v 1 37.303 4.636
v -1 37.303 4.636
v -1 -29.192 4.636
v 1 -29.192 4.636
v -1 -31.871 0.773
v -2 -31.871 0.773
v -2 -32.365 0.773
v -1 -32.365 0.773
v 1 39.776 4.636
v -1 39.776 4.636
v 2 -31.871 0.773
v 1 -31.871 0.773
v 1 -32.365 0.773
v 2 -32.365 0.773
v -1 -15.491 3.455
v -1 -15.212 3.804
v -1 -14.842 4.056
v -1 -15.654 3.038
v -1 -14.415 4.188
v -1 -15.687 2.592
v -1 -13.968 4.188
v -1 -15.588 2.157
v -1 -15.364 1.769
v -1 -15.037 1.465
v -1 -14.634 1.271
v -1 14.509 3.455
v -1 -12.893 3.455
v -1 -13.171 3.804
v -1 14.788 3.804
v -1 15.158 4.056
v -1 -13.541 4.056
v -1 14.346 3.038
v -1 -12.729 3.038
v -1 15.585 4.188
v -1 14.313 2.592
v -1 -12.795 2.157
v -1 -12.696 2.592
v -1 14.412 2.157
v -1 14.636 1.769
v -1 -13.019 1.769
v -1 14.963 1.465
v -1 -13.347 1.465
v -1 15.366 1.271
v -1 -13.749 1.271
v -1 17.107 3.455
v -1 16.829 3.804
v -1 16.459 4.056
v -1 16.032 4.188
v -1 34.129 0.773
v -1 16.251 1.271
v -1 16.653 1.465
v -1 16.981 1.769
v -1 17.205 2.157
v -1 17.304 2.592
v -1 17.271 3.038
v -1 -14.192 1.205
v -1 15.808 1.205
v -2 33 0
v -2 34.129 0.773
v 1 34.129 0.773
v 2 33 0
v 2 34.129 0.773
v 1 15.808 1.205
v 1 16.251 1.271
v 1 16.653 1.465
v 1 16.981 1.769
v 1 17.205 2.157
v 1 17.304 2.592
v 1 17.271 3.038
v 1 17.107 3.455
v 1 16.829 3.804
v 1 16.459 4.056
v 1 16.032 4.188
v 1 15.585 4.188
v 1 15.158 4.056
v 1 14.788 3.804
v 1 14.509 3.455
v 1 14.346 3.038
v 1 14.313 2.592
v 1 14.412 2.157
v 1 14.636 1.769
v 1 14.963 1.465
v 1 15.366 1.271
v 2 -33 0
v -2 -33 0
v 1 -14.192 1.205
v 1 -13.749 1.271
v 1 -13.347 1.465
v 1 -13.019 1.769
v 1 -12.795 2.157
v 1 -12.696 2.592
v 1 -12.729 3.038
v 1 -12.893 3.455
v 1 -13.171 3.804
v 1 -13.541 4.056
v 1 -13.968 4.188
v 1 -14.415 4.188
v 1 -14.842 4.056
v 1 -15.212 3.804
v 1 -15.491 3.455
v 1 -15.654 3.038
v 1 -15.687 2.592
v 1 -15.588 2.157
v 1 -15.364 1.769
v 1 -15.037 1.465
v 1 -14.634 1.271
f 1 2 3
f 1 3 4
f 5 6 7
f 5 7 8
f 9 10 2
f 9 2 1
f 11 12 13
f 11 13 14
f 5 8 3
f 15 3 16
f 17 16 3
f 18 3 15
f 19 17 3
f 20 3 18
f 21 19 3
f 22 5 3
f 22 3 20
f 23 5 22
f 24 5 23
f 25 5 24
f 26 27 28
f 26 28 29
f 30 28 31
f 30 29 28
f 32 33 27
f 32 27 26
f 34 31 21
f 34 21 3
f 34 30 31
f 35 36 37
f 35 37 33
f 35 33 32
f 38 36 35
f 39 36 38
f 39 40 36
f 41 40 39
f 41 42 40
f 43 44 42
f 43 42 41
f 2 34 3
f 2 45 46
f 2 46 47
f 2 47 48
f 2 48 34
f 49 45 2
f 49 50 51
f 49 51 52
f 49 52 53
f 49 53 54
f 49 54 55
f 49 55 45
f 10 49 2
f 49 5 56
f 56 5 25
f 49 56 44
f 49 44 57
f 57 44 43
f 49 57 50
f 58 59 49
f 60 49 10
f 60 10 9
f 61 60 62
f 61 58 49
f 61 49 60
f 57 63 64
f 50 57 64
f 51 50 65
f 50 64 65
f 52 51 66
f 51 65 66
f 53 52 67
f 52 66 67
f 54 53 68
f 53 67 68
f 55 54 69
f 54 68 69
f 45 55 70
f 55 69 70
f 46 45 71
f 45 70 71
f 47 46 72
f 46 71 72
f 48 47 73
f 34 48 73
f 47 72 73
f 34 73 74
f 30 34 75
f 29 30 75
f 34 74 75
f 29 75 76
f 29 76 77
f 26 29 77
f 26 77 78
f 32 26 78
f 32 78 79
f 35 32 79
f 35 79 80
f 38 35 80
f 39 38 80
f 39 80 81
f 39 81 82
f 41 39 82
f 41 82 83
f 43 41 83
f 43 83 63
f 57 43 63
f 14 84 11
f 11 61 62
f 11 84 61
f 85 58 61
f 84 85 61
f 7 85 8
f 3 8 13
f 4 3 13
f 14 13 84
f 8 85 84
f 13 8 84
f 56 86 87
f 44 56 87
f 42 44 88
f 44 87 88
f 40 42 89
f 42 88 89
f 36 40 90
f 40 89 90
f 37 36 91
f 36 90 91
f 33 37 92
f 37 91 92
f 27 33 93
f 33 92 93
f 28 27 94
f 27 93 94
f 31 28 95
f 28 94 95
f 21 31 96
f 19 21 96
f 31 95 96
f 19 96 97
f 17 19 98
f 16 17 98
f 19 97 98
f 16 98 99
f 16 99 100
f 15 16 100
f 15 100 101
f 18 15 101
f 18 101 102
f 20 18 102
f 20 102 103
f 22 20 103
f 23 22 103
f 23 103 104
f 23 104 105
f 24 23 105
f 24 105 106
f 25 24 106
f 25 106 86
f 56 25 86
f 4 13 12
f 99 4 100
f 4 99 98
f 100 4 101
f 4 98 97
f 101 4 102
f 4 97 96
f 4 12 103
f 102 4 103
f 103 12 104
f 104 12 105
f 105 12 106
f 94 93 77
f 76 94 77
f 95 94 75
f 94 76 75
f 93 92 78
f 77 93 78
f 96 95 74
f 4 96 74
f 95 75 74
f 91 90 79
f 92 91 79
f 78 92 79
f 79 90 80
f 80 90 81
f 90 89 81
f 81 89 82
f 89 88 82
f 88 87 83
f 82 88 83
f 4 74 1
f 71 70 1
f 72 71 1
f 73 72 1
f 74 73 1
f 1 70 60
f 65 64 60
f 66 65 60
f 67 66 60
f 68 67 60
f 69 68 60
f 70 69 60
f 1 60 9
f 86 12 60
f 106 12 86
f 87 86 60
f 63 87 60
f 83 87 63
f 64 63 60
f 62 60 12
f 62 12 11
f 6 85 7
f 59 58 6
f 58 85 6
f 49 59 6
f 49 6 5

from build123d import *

# Parameters (mm, degrees)
SKETCH1_W             = 4
SKETCH1_H             = 66
BOSS_EXTRUDE1_DEPTH   = 1
SKETCH1_2_W           = 4
SKETCH1_2_H           = 66
BOSS_EXTRUDE2_DEPTH   = 1.36844839
SKETCH4_W             = 2
SKETCH4_H             = 66.494663906
BOSS_EXTRUDE3_DEPTH   = 5
SKETCH4_2_W           = 2
SKETCH4_2_H           = 66.494663906
BOSS_EXTRUDE4_DEPTH   = 6.842238407
F_3_0MM_DOWEL_HOLE1_D = 3


with BuildPart() as part:
    # Sketch1 → Boss-Extrude1 (new, along a direction that is not the sketch's normal)
    with BuildSketch(Plane.XY):
        Rectangle(SKETCH1_W, SKETCH1_H)
    extrude(amount=BOSS_EXTRUDE1_DEPTH, dir=(0, 0.6347305132022716, 0.7727335734973478))

    # Sketch1<2> → Boss-Extrude2 (add, along a direction that is not the sketch's normal)
    with BuildSketch(Plane.XY):
        Rectangle(SKETCH1_2_W, SKETCH1_2_H)
    extrude(amount=BOSS_EXTRUDE2_DEPTH, dir=(0, 0.8253106586930028, 0.5646789500660725))

    # Sketch4 → Boss-Extrude3 (add, along a direction that is not the sketch's normal)
    with BuildSketch(Plane.XY.offset(0.772733573)):
        with Locations((0, 0.882062466)):
            Rectangle(SKETCH4_W, SKETCH4_H)
    extrude(amount=BOSS_EXTRUDE3_DEPTH, dir=(0, 0.6347305132022716, 0.7727335734973478))

    # Sketch4<2> → Boss-Extrude4 (add, along a direction that is not the sketch's normal)
    with BuildSketch(Plane.XY.offset(0.772733573)):
        with Locations((0, 0.882062466)):
            Rectangle(SKETCH4_2_W, SKETCH4_2_H)
    extrude(amount=BOSS_EXTRUDE4_DEPTH, dir=(0, 0.8253106586930028, 0.5646789500660725))

    # Ø3.0mm Dowel Hole1 (through all)
    with Locations(Plane.ZY.offset(1)):
        with Locations((2.704567507, -14.191616921), (2.704567507, 15.808383079)):
            Hole(F_3_0MM_DOWEL_HOLE1_D / 2)


solid = part.part
